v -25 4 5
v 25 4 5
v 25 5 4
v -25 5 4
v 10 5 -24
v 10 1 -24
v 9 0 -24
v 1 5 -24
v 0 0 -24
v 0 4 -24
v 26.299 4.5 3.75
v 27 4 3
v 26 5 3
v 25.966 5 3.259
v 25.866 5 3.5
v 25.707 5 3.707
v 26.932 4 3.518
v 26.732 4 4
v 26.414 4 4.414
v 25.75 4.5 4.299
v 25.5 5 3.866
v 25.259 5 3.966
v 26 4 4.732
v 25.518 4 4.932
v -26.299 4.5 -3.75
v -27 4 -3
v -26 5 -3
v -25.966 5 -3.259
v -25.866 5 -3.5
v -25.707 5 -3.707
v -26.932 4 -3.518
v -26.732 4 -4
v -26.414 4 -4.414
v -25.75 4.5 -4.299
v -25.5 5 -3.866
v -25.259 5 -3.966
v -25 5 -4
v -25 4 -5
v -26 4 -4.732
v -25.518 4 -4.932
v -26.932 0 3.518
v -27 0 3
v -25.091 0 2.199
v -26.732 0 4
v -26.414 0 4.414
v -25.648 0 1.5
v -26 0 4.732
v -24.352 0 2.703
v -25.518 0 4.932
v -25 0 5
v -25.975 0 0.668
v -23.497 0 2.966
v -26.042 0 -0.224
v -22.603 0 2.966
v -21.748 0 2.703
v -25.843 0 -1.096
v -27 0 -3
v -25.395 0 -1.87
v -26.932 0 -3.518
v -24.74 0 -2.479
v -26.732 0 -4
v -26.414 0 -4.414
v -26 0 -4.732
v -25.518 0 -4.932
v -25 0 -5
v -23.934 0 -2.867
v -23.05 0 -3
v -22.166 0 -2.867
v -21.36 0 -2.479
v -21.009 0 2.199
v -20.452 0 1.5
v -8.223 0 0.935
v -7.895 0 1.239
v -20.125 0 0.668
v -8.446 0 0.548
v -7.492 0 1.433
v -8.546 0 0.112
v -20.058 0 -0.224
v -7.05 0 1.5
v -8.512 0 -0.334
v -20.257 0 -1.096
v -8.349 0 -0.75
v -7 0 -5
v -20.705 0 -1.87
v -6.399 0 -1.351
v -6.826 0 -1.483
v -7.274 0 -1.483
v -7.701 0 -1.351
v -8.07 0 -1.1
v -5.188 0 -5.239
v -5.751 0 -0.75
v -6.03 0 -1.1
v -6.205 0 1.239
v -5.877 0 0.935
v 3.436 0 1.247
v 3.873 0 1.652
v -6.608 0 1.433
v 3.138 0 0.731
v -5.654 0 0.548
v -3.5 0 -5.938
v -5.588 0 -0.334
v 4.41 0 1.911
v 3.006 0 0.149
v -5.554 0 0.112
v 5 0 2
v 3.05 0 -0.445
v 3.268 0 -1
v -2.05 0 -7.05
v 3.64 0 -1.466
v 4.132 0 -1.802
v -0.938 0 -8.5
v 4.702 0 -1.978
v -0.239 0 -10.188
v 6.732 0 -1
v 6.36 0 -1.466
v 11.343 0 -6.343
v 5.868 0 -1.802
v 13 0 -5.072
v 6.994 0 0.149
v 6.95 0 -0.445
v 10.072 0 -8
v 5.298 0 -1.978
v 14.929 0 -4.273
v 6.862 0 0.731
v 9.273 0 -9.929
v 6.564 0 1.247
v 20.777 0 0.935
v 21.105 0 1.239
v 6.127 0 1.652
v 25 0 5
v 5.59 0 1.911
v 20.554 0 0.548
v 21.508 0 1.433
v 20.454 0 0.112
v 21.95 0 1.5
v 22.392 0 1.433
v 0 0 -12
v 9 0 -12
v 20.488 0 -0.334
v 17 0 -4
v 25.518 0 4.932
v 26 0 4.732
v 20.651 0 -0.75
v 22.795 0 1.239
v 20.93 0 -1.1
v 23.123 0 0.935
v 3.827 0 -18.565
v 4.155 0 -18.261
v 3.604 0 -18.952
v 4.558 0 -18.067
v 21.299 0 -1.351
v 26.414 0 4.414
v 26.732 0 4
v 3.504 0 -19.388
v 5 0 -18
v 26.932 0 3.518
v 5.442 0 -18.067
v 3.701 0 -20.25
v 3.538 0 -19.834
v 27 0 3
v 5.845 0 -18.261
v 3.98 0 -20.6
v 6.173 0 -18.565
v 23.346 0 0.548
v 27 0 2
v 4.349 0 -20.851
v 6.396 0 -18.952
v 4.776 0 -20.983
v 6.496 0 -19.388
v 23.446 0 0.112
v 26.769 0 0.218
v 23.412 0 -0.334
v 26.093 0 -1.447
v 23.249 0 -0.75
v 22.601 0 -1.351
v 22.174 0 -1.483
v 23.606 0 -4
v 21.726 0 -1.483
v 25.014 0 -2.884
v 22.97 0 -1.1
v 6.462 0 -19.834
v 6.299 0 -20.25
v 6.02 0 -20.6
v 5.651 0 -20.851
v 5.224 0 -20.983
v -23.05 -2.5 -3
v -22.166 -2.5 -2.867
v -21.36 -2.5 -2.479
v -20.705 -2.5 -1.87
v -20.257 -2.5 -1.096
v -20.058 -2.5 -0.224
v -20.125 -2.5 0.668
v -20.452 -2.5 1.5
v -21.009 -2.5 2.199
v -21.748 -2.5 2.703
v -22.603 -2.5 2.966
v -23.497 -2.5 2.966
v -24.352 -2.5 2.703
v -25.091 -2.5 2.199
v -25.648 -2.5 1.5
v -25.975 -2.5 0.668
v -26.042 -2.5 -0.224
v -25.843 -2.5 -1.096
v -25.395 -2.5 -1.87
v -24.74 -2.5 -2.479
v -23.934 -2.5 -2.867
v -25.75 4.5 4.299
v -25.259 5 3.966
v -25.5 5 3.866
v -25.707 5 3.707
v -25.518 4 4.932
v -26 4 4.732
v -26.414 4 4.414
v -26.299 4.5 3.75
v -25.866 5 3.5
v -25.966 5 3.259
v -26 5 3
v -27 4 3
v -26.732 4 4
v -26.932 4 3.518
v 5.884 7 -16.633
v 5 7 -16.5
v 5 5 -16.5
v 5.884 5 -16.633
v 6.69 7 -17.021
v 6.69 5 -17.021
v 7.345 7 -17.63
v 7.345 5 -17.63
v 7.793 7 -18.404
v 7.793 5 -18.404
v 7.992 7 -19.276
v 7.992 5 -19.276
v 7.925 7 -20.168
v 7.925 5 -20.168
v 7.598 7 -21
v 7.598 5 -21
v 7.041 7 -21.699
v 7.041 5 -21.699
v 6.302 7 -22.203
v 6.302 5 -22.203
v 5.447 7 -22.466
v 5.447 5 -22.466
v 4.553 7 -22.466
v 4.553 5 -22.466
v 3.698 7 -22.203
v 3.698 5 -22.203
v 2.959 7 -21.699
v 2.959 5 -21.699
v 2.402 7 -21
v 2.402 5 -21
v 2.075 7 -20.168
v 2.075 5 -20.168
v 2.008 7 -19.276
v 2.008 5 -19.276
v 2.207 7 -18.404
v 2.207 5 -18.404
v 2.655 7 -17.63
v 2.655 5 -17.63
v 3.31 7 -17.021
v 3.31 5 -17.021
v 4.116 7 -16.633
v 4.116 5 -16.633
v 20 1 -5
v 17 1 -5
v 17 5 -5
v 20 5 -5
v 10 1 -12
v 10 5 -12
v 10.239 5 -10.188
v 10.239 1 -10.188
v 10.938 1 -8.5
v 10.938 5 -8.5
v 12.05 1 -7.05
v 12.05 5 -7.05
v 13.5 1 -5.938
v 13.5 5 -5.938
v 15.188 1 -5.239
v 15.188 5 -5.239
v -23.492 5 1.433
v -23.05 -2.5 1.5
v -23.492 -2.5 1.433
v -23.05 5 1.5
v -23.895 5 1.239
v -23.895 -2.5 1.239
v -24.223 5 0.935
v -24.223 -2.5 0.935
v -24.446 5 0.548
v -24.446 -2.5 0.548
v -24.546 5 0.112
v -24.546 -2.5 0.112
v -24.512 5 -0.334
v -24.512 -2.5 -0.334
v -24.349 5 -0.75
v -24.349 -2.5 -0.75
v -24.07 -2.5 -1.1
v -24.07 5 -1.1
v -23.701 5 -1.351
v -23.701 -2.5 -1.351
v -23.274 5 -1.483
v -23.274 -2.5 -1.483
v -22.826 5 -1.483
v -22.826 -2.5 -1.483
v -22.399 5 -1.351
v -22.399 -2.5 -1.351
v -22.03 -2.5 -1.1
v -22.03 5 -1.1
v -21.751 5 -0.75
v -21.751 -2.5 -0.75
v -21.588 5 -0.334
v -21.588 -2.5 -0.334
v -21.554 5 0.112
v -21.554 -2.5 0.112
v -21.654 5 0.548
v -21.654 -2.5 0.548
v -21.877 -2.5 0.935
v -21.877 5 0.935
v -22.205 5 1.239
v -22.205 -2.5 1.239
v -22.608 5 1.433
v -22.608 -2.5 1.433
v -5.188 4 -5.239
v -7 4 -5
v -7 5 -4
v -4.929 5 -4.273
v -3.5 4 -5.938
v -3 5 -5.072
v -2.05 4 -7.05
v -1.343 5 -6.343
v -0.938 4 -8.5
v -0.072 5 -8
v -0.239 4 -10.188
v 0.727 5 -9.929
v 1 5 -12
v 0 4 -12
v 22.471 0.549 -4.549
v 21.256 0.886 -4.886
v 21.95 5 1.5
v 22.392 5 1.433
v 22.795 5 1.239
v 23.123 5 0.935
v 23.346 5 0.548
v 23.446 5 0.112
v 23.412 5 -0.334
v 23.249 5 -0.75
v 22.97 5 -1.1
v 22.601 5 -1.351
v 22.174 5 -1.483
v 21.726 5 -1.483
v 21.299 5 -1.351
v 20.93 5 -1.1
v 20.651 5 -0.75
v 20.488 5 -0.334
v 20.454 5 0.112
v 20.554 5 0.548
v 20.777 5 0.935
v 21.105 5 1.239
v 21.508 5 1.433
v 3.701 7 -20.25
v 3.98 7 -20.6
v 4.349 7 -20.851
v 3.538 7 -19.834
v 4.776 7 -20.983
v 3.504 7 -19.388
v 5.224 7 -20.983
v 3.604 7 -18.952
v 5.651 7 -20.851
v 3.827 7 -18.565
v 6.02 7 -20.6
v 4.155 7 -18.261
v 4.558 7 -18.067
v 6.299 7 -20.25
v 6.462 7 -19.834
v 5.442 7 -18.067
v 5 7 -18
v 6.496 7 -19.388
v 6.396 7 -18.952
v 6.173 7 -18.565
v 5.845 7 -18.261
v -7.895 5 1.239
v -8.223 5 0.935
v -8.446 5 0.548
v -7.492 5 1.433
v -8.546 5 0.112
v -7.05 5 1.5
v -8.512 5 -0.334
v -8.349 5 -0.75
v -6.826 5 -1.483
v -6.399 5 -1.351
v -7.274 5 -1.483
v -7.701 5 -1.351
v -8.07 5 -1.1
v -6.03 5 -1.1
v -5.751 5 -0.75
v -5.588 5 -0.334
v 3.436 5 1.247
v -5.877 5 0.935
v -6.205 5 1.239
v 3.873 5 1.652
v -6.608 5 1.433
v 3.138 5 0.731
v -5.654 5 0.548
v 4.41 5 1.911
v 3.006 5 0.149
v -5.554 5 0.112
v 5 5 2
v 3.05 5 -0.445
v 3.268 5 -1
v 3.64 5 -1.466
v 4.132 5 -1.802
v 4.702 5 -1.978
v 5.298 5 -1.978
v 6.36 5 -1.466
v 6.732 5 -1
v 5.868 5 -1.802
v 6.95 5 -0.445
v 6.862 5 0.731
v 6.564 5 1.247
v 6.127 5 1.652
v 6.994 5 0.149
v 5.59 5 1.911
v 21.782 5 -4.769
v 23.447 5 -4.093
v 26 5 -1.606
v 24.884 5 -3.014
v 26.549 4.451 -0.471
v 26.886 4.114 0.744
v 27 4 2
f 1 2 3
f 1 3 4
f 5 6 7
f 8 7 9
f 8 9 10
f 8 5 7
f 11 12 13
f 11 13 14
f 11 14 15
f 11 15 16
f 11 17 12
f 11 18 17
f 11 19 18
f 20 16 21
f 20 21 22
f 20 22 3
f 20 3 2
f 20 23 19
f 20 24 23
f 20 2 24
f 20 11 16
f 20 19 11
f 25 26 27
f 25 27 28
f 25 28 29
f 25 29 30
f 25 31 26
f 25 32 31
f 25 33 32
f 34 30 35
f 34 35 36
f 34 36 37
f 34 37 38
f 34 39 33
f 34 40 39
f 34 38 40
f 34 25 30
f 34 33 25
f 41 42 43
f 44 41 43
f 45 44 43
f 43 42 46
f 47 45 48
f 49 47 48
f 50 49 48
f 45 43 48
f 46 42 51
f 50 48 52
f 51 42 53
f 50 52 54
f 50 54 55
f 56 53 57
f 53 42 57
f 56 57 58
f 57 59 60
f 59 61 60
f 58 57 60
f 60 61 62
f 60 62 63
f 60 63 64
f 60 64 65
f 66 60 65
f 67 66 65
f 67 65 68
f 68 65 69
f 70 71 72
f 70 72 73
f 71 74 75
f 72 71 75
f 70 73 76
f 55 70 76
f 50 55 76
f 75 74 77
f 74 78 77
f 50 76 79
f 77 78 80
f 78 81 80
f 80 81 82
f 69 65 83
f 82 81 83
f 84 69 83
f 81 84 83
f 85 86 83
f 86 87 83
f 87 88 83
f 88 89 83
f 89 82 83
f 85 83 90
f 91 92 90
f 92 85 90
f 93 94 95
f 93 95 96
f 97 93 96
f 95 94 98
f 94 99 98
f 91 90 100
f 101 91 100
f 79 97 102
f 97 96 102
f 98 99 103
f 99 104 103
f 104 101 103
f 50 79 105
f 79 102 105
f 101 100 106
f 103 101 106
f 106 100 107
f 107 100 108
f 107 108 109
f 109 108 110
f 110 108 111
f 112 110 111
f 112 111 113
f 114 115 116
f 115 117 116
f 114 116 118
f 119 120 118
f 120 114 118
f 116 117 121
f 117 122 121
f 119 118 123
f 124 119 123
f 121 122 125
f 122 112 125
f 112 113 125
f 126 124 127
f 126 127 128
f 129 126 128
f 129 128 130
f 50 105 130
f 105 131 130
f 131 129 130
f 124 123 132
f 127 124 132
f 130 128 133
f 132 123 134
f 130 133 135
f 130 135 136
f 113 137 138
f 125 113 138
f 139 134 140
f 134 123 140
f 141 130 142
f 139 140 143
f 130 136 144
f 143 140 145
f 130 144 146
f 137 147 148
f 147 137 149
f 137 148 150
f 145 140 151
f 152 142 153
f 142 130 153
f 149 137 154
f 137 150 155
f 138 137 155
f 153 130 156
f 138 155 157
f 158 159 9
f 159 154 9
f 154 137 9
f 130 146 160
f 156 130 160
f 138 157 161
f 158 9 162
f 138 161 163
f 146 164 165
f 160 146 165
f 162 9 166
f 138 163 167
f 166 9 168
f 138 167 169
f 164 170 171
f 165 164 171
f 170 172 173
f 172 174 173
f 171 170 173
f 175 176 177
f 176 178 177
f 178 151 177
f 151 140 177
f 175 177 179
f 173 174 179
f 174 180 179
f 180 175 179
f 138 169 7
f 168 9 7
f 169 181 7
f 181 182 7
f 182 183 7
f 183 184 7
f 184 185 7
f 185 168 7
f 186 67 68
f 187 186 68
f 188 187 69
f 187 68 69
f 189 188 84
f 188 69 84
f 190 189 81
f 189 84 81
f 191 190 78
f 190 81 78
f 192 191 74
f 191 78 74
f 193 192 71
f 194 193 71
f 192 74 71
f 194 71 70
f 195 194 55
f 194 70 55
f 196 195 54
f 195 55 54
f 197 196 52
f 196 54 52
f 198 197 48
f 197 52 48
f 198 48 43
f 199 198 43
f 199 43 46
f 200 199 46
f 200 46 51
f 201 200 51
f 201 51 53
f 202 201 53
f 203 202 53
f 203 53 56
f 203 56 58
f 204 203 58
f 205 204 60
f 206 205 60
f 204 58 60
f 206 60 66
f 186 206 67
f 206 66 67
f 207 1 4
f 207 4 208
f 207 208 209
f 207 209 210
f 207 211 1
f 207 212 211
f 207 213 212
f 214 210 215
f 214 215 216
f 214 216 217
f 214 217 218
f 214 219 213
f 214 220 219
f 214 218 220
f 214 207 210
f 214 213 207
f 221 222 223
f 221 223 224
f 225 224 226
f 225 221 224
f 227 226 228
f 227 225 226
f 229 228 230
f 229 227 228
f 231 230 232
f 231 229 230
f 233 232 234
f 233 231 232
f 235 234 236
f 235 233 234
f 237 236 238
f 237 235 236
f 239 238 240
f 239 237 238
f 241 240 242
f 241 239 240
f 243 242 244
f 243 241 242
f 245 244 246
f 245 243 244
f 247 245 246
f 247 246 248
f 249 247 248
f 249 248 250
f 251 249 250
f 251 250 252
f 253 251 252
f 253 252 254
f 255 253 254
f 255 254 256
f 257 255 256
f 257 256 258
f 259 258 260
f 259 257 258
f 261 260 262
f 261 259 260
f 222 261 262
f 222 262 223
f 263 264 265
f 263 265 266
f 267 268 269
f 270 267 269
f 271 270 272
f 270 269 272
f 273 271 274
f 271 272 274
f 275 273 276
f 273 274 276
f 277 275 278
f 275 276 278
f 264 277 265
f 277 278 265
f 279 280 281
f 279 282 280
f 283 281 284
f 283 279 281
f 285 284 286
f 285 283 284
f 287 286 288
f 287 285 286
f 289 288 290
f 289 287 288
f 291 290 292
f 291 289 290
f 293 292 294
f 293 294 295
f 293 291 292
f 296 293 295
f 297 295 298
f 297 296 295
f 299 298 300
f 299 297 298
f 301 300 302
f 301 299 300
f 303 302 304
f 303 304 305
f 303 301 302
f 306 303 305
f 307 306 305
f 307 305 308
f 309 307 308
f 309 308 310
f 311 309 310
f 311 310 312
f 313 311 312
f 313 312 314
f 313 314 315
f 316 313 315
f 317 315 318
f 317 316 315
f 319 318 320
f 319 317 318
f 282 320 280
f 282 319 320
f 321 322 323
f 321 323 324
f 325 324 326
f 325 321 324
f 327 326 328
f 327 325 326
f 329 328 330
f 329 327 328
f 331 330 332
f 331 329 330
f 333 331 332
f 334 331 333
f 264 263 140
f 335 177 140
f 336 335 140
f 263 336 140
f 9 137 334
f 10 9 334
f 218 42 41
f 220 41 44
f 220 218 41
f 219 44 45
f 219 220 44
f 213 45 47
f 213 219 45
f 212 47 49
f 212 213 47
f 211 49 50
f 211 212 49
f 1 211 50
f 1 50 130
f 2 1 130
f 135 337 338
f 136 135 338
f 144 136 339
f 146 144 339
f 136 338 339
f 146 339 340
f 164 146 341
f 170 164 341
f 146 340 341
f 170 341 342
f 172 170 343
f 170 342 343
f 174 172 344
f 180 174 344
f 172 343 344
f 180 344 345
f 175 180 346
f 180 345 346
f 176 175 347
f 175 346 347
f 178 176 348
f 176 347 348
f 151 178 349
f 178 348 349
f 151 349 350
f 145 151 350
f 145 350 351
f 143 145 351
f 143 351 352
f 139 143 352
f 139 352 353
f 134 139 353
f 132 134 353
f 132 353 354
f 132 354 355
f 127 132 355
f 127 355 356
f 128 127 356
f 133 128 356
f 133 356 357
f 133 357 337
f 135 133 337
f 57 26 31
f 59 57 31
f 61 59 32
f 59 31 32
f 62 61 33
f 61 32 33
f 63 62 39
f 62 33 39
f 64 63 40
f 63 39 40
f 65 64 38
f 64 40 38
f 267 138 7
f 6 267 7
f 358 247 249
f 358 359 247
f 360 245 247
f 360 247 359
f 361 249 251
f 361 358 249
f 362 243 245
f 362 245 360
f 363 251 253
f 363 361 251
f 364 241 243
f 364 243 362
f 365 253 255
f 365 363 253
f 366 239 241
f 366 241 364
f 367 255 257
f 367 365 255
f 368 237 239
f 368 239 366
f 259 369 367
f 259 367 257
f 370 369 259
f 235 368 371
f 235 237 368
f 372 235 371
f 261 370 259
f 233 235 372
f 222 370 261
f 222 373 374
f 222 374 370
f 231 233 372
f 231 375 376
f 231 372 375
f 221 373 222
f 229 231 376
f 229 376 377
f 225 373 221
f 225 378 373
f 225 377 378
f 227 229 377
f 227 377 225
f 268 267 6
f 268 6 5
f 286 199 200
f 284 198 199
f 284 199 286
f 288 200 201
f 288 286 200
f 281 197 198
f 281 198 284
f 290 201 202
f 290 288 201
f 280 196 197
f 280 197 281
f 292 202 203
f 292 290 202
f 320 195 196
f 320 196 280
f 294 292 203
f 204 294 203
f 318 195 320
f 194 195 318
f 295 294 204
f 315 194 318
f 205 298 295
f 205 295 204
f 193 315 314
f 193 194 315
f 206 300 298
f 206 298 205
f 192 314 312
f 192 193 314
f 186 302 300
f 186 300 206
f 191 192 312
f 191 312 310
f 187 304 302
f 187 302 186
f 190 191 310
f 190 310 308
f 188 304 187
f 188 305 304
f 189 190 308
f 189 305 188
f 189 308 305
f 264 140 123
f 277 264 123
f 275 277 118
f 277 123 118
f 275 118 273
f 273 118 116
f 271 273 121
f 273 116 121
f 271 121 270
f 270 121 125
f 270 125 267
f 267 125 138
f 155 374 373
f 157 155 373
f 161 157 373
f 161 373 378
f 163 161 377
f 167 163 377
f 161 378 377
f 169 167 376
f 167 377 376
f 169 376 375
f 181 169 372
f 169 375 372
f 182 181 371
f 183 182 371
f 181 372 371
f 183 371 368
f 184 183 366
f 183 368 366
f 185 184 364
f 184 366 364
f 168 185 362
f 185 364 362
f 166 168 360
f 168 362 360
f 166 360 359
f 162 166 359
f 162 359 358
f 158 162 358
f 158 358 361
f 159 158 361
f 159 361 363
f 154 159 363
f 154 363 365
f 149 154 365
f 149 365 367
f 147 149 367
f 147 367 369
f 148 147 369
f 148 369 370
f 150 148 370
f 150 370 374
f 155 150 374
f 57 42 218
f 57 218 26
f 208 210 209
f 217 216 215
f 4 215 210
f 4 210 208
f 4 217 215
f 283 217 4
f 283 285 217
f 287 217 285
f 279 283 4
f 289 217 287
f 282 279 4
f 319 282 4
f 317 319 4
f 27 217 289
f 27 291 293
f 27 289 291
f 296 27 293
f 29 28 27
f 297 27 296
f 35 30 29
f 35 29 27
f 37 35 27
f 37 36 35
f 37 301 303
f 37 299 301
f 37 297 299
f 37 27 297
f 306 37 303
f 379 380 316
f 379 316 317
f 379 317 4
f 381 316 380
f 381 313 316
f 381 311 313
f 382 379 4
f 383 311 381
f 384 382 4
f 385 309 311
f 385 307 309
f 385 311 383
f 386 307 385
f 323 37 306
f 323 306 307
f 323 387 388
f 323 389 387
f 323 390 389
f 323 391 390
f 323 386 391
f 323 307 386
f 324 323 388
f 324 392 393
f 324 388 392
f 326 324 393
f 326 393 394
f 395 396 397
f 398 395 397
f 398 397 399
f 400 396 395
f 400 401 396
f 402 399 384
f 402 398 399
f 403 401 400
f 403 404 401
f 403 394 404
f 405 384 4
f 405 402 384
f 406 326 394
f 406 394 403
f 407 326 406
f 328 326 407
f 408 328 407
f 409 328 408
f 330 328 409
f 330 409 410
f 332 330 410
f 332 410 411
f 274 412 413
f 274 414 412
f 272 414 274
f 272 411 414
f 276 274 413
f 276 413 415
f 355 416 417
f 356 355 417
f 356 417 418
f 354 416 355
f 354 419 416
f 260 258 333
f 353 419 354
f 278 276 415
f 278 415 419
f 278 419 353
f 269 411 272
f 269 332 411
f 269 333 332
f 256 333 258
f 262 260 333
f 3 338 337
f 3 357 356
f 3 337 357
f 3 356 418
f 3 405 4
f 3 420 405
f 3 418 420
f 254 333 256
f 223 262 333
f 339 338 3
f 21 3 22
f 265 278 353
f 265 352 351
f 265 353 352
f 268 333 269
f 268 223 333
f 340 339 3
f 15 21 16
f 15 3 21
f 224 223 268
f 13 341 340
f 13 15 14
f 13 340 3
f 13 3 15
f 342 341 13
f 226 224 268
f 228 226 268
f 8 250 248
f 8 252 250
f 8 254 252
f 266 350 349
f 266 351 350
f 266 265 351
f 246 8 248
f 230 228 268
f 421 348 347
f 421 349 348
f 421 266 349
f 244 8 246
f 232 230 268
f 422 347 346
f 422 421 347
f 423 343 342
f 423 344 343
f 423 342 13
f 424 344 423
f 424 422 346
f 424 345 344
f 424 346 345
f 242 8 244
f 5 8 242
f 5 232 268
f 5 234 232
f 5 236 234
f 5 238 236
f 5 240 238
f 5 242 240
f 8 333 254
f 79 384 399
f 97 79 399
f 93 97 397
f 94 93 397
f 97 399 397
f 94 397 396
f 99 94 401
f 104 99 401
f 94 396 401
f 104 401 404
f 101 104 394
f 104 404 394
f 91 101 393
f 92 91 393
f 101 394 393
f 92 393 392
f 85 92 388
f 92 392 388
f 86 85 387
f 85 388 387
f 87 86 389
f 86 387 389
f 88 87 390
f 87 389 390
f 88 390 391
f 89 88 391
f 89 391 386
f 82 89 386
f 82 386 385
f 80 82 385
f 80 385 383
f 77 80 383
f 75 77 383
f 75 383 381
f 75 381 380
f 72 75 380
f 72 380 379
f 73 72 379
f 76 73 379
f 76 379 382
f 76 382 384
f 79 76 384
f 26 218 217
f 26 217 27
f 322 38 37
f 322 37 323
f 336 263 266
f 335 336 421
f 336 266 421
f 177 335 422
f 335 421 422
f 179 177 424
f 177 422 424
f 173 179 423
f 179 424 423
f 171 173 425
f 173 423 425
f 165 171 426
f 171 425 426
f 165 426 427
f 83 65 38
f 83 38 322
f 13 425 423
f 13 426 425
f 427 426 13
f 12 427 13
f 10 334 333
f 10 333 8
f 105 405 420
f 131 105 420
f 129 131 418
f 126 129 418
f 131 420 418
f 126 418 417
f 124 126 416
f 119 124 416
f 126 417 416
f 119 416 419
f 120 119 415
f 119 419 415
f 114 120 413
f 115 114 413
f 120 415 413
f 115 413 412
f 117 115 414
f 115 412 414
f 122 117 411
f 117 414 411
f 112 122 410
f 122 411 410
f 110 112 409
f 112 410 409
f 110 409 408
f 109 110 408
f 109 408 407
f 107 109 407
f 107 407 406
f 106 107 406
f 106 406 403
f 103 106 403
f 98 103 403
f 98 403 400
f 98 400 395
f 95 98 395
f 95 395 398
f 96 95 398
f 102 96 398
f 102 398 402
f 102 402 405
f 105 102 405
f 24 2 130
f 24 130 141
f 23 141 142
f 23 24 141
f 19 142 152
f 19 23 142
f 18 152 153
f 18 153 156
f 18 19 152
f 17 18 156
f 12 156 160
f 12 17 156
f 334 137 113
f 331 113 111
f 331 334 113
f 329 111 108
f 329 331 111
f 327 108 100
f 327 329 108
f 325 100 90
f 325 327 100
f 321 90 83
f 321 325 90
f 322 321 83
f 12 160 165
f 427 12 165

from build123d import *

# Parameters (mm, degrees)
SKETCH1_W           = 54
SKETCH1_H           = 10
BOSS_EXTRUDE1_DEPTH = 5
SKETCH3_R           = 1.5
SKETCH3_R_2         = 2
CUT_EXTRUDE1_DEPTH  = 7
FILLET1_R           = 2
SKETCH4_R           = 3
SKETCH4_R_2         = 1.5
BOSS_EXTRUDE2_DEPTH = 2.5
SKETCH5_W           = 10
SKETCH5_H           = 5
BOSS_EXTRUDE3_DEPTH = 19
SKETCH6_R           = 1.5
CUT_EXTRUDE2_DEPTH  = 10
BOSS_EXTRUDE4_START = 2
SKETCH7_R           = 3
SKETCH7_R_2         = 1.5
BOSS_EXTRUDE4_DEPTH = 2
FILLET2_R           = 7
CHAMFER1_SIZE       = 1
FILLET3_R           = 7


with BuildPart() as part:
    # Sketch1 → Boss-Extrude1 (new body)
    with BuildSketch(Plane(origin=(0, 0, 0), x_dir=(1, 0, 0), z_dir=(0, 1, 0))):
        Rectangle(SKETCH1_W, SKETCH1_H)
    extrude(amount=BOSS_EXTRUDE1_DEPTH)

    # Sketch3 → Cut-Extrude1 (cut)
    with BuildSketch(Plane(origin=(0, 5, 0), x_dir=(1, 0, 0), z_dir=(0, 1, 0))):
        with Locations(Location((-23.05, 0, 0), (0, 0, 270))):
            Circle(SKETCH3_R)
        with Locations(Location((5, 0, 0), (0, 0, 270))):
            Circle(SKETCH3_R_2)
        with Locations(Location((-7.05, 0, 0), (0, 0, 270))):
            Circle(SKETCH3_R)
        with Locations(Location((21.95, 0, 0), (0, 0, 270))):
            Circle(SKETCH3_R)
    extrude(amount=-CUT_EXTRUDE1_DEPTH, mode=Mode.SUBTRACT)

    # Fillet1
    fillet1_edges = [part.edges().sort_by_distance(p)[0] for p in [
        (27, 2.5, 5),
        (-27, 2.5, 5),
        (-27, 2.5, -5),
    ]]
    fillet(fillet1_edges, radius=FILLET1_R)

    # Sketch4 → Boss-Extrude2 (add)
    with BuildSketch(Plane.XZ):
        with Locations(Location((-23.05, 0, 0), (0, 0, 270))):
            Circle(SKETCH4_R)
        with Locations(Location((-23.05, 0, 0), (0, 0, 90))):
            Circle(SKETCH4_R_2, mode=Mode.SUBTRACT)
    extrude(amount=BOSS_EXTRUDE2_DEPTH)

    # Sketch5 → Boss-Extrude3 (add)
    with BuildSketch(Plane(origin=(0, 0, -5), x_dir=(-1, 0, 0), z_dir=(0, 0, -1))):
        with Locations((-5, 2.5)):
            Rectangle(SKETCH5_W, SKETCH5_H)
    extrude(amount=BOSS_EXTRUDE3_DEPTH)

    # Sketch6 → Cut-Extrude2 (cut)
    with BuildSketch(Plane(origin=(0, 5, 0), x_dir=(1, 0, 0), z_dir=(0, 1, 0))):
        with Locations(Location((5, 19.5, 0), (0, 0, 270))):
            Circle(SKETCH6_R)
    extrude(amount=-CUT_EXTRUDE2_DEPTH, mode=Mode.SUBTRACT)

    # Sketch7 → Boss-Extrude4 (add)
    with BuildSketch(Plane(origin=(0, 5, 0), x_dir=(1, 0, 0), z_dir=(0, 1, 0)).offset(BOSS_EXTRUDE4_START)):
        with Locations(Location((5, 19.5, 0), (0, 0, 270))):
            Circle(SKETCH7_R)
        with Locations(Location((5, 19.5, 0), (0, 0, 270))):
            Circle(SKETCH7_R_2, mode=Mode.SUBTRACT)
    extrude(amount=-BOSS_EXTRUDE4_DEPTH)

    # Fillet2
    fillet2_edges = [part.edges().sort_by_distance(p)[0] for p in [
        (10, 2.5, -5),
        (0, 2.5, -5),
    ]]
    fillet(fillet2_edges, radius=FILLET2_R)

    # Chamfer1
    chamfer1_edges = [part.edges().sort_by_distance(p)[0] for p in [
        (10, 0, -18),
        (12.050252532, 0, -7.050252532),
        (22, 0, -5),
        (0, 5, -18),
        (-2.050252532, 5, -7.050252532),
        (-16, 5, -5),
        (-26.414213562, 5, -4.414213562),
        (-27, 5, 0),
        (-26.414213562, 5, 4.414213562),
        (0, 5, 5),
        (26.414213562, 5, 4.414213562),
        (27, 5, -1),
    ]]
    chamfer(chamfer1_edges, length=CHAMFER1_SIZE)

    # Fillet3
    fillet3_edges = [part.edges().sort_by_distance(p)[0] for p in [
        (27, 2.5, -5),
    ]]
    fillet(fillet3_edges, radius=FILLET3_R)


solid = part.part
